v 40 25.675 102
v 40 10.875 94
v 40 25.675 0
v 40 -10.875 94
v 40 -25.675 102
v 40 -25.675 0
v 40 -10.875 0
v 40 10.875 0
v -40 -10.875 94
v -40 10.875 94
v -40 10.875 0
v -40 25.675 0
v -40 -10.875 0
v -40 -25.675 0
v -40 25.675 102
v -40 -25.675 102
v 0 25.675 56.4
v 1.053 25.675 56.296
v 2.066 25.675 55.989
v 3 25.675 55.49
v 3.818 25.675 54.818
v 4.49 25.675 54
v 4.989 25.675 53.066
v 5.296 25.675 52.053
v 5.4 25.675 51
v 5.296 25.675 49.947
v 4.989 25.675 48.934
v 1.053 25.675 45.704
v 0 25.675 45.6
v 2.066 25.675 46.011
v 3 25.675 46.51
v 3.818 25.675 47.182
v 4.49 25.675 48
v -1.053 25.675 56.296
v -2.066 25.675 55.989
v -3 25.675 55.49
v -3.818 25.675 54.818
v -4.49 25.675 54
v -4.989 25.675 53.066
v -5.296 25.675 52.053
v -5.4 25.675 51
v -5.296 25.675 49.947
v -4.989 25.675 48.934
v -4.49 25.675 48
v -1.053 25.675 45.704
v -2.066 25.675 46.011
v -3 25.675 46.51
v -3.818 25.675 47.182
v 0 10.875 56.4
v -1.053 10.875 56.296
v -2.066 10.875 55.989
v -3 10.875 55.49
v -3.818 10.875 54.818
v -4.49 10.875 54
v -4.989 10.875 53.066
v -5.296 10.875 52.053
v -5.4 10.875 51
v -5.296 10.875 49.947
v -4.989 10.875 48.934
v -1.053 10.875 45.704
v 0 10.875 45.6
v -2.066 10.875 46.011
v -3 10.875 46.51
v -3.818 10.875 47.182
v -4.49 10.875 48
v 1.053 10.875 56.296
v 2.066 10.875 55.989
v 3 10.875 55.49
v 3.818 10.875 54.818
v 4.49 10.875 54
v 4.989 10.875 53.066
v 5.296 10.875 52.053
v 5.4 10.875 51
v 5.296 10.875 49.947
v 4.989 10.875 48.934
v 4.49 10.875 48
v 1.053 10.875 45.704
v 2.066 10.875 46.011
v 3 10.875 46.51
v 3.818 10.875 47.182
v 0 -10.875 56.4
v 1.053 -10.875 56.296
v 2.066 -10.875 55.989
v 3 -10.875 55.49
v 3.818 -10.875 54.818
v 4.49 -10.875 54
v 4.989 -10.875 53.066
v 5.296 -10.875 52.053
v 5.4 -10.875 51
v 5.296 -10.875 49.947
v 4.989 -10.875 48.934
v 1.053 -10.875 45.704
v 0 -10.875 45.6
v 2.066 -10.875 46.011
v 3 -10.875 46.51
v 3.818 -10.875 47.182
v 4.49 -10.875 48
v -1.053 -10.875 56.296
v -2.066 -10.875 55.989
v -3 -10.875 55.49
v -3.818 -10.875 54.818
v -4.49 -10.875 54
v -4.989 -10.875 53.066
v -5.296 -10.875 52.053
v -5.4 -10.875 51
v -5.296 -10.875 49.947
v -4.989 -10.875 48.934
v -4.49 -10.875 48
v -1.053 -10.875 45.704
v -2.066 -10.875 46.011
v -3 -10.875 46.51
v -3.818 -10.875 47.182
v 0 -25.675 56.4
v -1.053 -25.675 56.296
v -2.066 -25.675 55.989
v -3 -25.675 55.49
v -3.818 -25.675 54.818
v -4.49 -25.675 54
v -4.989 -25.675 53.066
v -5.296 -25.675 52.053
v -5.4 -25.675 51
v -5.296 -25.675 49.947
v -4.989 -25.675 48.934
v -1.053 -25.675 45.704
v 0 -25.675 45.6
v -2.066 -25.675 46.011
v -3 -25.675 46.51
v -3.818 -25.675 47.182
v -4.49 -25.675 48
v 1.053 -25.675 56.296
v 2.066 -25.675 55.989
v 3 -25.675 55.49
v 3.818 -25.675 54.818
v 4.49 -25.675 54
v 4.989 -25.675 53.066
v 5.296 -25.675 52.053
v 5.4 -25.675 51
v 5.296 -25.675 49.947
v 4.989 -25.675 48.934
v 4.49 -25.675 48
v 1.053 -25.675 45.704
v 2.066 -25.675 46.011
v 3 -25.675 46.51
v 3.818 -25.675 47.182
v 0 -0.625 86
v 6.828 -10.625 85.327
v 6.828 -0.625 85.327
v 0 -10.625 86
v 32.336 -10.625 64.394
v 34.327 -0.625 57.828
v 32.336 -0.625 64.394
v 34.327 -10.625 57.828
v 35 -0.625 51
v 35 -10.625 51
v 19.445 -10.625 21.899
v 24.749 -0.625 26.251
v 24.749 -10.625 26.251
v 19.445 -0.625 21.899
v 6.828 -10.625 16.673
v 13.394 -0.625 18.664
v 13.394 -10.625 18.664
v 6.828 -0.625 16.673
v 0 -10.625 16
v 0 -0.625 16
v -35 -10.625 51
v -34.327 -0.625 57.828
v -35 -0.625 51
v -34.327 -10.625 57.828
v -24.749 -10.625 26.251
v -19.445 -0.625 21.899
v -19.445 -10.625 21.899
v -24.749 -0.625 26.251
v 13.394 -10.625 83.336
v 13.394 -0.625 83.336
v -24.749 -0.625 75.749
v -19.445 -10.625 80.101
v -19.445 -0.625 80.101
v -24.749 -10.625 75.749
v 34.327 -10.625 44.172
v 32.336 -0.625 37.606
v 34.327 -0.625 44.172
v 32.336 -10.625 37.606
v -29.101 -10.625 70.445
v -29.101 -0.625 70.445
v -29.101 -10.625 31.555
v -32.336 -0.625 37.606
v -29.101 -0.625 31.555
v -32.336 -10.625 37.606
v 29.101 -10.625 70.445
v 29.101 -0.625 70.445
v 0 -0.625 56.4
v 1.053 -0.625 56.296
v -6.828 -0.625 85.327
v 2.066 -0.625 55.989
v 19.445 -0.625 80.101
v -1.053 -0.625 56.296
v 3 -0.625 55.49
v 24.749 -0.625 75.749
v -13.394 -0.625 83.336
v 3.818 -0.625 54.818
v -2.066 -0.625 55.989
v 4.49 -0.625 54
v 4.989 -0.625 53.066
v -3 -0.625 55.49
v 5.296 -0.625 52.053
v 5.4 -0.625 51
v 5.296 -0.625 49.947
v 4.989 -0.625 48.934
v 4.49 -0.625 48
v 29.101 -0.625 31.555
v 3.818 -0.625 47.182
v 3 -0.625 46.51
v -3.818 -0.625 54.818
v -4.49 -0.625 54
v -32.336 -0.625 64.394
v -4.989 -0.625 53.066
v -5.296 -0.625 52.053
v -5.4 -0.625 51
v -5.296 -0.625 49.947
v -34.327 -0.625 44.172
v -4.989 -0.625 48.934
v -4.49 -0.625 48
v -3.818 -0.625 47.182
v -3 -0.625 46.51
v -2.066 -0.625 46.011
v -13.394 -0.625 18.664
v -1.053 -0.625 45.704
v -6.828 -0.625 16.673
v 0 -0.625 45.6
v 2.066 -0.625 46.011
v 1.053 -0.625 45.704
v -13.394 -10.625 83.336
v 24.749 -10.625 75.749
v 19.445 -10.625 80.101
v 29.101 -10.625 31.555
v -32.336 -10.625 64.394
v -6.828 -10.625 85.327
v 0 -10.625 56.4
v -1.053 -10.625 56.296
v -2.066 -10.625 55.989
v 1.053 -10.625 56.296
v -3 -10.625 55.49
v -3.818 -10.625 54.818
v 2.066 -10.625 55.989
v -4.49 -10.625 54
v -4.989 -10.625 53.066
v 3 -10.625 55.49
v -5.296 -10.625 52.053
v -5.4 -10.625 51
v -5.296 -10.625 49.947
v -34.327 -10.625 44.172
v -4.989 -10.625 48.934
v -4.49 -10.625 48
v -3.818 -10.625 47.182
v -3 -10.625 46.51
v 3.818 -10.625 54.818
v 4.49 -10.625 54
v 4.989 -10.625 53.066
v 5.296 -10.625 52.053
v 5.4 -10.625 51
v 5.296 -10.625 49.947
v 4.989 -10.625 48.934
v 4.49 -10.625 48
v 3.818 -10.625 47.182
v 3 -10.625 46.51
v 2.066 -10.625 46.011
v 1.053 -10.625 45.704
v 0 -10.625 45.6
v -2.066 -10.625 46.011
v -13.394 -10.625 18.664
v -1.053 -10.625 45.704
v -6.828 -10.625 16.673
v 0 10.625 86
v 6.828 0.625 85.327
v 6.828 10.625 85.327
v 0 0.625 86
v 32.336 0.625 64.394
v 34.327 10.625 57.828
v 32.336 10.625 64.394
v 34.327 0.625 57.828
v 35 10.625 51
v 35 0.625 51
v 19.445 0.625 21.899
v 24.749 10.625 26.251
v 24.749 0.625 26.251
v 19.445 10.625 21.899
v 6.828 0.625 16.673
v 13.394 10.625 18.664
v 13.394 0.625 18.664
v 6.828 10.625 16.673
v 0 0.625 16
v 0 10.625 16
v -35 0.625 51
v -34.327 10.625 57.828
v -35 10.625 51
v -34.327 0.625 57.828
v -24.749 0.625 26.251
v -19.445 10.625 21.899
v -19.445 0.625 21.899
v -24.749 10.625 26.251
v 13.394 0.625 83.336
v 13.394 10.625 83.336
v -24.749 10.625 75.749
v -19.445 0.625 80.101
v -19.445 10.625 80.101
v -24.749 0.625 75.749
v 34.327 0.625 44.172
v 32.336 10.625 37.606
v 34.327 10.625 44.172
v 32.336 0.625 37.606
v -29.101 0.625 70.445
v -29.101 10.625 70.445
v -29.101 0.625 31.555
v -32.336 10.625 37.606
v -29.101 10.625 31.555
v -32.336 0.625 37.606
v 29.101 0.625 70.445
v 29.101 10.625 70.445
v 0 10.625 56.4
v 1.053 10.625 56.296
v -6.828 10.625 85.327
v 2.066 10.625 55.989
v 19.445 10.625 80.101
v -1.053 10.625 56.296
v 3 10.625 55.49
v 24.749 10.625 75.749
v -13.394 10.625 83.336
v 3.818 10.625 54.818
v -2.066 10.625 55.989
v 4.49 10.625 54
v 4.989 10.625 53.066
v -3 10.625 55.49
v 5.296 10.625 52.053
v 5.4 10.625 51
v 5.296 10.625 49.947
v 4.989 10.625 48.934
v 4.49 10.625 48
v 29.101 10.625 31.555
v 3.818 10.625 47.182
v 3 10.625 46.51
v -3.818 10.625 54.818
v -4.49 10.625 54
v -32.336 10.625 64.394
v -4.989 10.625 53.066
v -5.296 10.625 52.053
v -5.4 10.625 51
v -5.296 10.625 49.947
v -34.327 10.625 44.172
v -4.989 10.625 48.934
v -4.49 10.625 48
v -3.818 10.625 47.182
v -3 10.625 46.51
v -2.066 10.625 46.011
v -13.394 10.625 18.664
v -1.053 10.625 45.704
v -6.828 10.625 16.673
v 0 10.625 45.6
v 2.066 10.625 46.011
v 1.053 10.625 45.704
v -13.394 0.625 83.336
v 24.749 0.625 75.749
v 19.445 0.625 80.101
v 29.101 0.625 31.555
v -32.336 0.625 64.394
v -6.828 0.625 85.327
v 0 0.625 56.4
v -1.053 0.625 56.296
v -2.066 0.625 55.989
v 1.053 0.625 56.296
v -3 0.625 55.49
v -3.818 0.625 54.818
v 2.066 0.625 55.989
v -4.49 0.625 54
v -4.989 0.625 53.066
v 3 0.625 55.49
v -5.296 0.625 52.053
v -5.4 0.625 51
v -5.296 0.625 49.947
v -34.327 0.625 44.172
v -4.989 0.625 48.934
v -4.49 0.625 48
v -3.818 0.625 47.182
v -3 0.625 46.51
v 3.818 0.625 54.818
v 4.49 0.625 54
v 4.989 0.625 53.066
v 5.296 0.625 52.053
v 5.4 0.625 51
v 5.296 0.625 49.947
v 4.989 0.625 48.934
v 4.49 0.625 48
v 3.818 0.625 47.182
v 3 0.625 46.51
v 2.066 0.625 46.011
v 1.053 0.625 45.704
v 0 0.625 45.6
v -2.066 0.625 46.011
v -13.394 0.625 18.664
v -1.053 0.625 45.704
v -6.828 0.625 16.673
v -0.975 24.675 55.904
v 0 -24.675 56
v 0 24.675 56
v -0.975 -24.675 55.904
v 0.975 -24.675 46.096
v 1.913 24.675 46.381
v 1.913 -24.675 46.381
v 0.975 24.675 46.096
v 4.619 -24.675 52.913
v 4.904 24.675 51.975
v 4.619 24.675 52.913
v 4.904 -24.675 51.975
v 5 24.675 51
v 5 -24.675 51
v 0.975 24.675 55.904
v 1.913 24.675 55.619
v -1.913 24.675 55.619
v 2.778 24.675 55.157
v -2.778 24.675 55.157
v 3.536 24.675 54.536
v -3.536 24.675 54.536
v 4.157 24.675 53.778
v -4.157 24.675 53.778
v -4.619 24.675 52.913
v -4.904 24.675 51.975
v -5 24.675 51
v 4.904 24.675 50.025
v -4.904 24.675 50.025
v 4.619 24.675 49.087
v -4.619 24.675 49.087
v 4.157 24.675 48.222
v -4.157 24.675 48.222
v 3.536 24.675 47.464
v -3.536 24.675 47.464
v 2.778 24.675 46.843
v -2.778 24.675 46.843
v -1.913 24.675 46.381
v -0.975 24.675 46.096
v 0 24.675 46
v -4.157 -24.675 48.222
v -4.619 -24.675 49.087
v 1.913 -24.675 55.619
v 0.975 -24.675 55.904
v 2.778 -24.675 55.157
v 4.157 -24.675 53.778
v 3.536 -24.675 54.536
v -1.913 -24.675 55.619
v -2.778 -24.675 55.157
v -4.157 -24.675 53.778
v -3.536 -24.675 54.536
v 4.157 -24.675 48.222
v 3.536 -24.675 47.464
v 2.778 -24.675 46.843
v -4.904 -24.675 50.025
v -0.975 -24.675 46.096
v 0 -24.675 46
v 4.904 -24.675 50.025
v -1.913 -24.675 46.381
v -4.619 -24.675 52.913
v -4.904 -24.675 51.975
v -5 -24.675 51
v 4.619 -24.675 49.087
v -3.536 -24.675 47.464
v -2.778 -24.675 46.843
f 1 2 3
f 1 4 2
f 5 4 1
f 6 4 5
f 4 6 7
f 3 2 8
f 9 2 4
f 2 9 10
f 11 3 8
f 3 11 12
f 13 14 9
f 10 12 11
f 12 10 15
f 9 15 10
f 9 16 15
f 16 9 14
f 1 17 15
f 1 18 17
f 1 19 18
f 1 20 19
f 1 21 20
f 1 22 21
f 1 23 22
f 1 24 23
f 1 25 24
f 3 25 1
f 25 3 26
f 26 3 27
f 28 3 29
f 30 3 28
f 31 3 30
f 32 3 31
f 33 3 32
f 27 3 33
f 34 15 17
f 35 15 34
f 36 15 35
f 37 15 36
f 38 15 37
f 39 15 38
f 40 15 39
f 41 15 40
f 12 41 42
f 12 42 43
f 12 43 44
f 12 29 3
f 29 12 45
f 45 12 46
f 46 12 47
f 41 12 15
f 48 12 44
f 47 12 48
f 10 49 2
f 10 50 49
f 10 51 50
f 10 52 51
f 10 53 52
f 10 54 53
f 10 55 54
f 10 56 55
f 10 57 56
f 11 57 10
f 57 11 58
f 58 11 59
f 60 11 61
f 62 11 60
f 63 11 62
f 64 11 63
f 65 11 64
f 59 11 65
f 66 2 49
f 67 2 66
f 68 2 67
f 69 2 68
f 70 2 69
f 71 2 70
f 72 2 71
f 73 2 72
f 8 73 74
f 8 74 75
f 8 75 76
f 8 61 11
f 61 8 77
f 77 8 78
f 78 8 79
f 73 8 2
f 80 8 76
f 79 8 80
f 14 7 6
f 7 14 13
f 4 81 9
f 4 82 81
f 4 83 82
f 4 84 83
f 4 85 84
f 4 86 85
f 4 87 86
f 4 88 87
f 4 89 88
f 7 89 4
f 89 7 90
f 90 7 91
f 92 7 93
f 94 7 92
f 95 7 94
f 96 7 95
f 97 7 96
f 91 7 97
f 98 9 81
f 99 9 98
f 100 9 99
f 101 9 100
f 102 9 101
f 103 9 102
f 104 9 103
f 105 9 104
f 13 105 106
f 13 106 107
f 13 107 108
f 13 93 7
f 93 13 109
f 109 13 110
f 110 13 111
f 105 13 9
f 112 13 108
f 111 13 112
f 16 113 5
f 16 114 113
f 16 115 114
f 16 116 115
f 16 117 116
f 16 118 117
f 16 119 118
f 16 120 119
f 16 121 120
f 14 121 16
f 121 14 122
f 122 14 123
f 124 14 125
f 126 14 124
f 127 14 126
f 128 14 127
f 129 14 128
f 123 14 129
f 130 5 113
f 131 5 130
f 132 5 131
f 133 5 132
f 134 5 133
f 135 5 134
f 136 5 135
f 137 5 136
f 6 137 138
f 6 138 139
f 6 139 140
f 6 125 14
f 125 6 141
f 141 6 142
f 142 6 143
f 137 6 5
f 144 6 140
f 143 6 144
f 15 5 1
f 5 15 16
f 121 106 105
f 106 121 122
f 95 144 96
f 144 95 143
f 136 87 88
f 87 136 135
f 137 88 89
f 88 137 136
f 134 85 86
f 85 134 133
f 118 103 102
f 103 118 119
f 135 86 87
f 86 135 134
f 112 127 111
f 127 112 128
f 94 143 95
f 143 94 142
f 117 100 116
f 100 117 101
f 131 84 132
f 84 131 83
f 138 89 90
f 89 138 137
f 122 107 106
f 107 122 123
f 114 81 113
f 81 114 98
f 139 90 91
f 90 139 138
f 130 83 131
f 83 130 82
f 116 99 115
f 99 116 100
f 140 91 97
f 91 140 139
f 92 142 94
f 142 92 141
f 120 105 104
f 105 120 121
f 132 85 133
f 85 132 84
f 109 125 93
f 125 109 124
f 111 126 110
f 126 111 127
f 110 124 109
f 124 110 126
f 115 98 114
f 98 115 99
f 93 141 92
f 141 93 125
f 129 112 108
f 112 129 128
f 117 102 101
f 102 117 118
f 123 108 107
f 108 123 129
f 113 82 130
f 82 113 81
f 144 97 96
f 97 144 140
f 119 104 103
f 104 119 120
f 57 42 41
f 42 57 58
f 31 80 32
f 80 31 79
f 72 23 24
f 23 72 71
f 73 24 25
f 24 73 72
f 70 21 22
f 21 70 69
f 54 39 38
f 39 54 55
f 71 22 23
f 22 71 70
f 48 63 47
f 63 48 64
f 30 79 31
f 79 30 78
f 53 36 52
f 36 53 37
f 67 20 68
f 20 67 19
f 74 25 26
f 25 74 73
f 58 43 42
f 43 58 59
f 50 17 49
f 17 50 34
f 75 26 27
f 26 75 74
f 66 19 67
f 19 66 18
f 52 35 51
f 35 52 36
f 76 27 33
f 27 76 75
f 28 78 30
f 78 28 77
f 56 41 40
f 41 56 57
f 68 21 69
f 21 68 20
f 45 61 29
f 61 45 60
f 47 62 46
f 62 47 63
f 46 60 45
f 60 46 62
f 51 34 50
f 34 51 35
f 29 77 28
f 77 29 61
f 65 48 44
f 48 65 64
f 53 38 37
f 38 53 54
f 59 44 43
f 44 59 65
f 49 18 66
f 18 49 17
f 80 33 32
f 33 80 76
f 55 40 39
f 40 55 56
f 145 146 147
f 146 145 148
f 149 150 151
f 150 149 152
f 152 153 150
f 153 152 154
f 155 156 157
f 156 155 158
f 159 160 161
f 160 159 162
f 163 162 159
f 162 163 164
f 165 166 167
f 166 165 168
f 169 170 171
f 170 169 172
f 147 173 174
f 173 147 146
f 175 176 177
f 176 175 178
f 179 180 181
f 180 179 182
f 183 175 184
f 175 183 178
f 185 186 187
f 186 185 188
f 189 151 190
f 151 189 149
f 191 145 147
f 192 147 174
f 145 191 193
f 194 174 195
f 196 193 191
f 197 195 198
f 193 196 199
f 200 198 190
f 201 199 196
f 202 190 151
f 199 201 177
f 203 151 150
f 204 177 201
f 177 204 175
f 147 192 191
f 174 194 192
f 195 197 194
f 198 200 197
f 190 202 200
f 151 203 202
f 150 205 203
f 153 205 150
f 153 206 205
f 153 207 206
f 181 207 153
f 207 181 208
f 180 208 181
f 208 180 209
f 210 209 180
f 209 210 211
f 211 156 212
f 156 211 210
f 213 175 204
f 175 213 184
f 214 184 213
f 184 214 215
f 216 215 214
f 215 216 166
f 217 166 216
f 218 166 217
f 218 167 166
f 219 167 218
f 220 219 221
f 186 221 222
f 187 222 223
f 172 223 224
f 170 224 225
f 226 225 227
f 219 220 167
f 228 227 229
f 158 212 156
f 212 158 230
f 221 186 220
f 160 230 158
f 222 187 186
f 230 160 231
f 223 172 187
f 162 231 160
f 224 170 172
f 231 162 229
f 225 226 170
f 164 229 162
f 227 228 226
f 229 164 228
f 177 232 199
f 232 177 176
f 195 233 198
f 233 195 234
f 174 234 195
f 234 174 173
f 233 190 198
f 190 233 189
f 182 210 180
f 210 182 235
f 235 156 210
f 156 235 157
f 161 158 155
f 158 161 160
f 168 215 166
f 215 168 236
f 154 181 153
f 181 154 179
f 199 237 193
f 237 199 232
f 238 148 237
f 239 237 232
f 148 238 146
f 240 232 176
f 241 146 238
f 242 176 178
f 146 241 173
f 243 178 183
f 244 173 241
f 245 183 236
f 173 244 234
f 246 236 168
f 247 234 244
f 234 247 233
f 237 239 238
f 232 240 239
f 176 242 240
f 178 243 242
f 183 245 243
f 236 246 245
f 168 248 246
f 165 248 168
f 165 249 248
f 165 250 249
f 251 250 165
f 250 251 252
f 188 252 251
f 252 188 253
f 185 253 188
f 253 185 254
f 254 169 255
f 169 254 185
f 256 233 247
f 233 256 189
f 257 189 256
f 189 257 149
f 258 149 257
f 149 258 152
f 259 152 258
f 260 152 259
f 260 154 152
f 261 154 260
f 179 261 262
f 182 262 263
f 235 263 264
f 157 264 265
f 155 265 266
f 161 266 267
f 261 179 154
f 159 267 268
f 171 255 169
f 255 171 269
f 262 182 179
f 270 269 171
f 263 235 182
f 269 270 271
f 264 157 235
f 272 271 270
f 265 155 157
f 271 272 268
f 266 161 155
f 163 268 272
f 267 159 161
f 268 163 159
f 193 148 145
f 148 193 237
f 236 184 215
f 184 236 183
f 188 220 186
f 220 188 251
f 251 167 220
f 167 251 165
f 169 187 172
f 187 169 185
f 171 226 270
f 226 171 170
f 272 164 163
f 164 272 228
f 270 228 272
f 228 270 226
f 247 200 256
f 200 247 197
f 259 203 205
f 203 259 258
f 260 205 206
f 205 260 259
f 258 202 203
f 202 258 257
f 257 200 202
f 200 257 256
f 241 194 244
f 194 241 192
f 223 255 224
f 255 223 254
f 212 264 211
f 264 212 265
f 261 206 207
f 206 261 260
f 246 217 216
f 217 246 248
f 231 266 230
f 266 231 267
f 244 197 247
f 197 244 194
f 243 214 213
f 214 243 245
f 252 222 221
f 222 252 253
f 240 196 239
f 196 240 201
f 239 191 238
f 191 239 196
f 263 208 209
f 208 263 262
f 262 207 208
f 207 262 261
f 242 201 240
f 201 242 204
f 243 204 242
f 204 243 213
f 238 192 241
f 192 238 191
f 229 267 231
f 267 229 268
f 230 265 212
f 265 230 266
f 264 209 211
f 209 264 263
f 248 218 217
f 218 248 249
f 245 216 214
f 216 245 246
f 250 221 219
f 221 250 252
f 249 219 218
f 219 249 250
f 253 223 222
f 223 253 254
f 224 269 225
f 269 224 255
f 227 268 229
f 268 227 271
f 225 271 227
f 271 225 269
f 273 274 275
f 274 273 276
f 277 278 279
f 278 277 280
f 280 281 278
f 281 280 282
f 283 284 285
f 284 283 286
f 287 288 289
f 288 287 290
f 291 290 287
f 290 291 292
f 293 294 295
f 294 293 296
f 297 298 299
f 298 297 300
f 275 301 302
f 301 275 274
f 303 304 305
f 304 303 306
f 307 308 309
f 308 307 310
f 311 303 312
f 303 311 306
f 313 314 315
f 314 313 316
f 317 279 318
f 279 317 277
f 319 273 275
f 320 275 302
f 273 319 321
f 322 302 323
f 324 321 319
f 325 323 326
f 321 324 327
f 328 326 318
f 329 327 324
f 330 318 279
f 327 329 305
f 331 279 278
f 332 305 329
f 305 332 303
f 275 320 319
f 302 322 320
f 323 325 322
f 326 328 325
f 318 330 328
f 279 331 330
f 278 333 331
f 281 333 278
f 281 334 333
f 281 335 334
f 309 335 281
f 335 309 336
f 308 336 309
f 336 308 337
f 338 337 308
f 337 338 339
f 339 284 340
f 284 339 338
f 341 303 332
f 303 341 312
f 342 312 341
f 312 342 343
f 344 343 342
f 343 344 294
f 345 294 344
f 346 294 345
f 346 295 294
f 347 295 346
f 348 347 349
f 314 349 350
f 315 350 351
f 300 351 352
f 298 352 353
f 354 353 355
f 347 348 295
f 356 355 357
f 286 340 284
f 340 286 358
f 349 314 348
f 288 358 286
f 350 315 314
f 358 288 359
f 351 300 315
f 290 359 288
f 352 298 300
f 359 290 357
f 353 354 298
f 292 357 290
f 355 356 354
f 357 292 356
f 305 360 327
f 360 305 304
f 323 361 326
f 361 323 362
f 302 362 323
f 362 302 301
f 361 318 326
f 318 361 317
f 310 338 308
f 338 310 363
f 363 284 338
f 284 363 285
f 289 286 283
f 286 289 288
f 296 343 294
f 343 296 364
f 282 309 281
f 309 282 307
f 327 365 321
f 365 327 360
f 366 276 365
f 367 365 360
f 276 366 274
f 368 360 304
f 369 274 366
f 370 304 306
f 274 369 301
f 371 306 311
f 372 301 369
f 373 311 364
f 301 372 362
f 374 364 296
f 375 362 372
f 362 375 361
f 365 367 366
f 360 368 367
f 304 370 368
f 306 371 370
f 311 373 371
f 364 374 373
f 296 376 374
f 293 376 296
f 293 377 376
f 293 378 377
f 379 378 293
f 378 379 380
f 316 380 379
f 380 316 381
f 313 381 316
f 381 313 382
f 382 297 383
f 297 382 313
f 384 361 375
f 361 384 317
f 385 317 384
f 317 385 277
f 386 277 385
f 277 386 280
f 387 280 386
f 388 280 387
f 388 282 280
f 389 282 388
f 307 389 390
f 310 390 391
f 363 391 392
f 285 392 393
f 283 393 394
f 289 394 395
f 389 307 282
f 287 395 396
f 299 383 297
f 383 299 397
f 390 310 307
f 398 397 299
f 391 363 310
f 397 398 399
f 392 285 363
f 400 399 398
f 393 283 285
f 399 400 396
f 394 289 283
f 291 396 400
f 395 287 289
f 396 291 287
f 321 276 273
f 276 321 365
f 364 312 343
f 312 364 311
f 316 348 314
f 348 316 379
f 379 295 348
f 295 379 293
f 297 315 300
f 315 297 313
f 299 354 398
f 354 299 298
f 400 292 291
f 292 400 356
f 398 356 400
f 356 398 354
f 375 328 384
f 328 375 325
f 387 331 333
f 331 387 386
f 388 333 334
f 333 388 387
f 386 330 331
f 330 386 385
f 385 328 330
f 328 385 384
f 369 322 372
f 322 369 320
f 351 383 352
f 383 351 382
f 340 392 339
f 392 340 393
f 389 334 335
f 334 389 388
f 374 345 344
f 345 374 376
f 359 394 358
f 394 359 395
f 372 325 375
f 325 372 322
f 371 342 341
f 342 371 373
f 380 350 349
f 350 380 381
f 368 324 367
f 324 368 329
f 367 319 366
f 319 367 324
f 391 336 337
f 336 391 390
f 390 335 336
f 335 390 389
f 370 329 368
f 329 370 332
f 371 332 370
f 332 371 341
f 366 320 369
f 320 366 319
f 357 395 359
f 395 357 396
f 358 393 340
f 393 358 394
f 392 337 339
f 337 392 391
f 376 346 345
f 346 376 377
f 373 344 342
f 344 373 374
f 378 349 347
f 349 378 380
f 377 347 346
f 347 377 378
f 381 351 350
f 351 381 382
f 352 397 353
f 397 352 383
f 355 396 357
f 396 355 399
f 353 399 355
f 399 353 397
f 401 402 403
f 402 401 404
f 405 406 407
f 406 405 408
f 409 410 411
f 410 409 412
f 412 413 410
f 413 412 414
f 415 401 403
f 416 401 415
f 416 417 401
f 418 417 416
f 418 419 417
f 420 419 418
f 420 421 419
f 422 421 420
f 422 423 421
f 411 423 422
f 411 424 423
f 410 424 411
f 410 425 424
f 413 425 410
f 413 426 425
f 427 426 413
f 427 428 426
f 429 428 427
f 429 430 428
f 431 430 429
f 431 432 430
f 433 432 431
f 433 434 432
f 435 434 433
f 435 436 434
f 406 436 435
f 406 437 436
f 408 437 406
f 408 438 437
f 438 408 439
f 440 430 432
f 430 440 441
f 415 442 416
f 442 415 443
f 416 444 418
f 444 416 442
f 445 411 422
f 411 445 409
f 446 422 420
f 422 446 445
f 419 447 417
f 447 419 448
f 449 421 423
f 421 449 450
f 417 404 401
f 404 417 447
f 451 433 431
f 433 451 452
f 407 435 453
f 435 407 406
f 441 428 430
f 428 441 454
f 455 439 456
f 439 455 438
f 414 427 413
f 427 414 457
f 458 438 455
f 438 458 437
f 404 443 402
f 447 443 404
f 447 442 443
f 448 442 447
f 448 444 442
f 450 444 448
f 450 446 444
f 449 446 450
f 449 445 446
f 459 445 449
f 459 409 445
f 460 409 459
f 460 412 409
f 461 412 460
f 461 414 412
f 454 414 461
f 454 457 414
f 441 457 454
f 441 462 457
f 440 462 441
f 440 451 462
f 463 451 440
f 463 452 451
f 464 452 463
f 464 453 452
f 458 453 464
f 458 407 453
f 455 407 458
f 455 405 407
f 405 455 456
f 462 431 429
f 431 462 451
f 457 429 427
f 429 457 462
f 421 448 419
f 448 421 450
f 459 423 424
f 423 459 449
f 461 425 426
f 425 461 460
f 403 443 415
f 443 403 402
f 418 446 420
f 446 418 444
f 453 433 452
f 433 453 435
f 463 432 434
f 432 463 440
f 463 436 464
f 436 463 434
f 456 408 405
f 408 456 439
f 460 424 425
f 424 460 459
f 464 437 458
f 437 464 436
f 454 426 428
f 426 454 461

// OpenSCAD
$fn = 32;

// ------------------------------------------------------------------------
// Trolley wheel set: wheels d70, fork 94 mm tall
// Every part is its own module, assembly() places every instance.
// ------------------------------------------------------------------------

// --- part 1 ---
module trolley_fork() {
  difference() {
    union() {
      translate([-40, 10.875, 0]) cube([80, 14.8, 94]);
      translate([-40, -25.675, 0]) cube([80, 14.8, 94]);
      translate([-40, -25.675, 94]) cube([80, 51.35, 8]);
    }
    translate([0, -18.275, 51]) rotate([90, 0, 0]) cylinder(h = 16.8, d = 10.8, center = true);
    translate([0, 18.275, 51]) rotate([90, 0, 0]) cylinder(h = 16.8, d = 10.8, center = true);
  }
}

// --- part 2 ---
module trolley_wheel() {
  difference() {
      translate([0, 0, 0]) cylinder(h = 10, d = 70);
      translate([0, 0, -1]) cylinder(h = 12, d = 10.8);
    }
}

// --- part 3 ---
module trolley_axle() {
  translate([0, 0, -24.675]) cylinder(h = 49.35, d = 10);
}

// --- assembly ---
module assembly() {
  color([0.80, 0.24, 0.20]) translate([0, 0, 0]) rotate([0, 0, 0]) trolley_fork();
  color([0.20, 0.45, 0.75]) translate([0, -0.625, 51]) rotate([90, 0, 0]) trolley_wheel();
  color([0.25, 0.62, 0.32]) translate([0, 10.625, 51]) rotate([90, 0, 0]) trolley_wheel();
  color([0.92, 0.70, 0.18]) translate([0, 0, 51]) rotate([90, 0, 0]) trolley_axle();
}

assembly();
